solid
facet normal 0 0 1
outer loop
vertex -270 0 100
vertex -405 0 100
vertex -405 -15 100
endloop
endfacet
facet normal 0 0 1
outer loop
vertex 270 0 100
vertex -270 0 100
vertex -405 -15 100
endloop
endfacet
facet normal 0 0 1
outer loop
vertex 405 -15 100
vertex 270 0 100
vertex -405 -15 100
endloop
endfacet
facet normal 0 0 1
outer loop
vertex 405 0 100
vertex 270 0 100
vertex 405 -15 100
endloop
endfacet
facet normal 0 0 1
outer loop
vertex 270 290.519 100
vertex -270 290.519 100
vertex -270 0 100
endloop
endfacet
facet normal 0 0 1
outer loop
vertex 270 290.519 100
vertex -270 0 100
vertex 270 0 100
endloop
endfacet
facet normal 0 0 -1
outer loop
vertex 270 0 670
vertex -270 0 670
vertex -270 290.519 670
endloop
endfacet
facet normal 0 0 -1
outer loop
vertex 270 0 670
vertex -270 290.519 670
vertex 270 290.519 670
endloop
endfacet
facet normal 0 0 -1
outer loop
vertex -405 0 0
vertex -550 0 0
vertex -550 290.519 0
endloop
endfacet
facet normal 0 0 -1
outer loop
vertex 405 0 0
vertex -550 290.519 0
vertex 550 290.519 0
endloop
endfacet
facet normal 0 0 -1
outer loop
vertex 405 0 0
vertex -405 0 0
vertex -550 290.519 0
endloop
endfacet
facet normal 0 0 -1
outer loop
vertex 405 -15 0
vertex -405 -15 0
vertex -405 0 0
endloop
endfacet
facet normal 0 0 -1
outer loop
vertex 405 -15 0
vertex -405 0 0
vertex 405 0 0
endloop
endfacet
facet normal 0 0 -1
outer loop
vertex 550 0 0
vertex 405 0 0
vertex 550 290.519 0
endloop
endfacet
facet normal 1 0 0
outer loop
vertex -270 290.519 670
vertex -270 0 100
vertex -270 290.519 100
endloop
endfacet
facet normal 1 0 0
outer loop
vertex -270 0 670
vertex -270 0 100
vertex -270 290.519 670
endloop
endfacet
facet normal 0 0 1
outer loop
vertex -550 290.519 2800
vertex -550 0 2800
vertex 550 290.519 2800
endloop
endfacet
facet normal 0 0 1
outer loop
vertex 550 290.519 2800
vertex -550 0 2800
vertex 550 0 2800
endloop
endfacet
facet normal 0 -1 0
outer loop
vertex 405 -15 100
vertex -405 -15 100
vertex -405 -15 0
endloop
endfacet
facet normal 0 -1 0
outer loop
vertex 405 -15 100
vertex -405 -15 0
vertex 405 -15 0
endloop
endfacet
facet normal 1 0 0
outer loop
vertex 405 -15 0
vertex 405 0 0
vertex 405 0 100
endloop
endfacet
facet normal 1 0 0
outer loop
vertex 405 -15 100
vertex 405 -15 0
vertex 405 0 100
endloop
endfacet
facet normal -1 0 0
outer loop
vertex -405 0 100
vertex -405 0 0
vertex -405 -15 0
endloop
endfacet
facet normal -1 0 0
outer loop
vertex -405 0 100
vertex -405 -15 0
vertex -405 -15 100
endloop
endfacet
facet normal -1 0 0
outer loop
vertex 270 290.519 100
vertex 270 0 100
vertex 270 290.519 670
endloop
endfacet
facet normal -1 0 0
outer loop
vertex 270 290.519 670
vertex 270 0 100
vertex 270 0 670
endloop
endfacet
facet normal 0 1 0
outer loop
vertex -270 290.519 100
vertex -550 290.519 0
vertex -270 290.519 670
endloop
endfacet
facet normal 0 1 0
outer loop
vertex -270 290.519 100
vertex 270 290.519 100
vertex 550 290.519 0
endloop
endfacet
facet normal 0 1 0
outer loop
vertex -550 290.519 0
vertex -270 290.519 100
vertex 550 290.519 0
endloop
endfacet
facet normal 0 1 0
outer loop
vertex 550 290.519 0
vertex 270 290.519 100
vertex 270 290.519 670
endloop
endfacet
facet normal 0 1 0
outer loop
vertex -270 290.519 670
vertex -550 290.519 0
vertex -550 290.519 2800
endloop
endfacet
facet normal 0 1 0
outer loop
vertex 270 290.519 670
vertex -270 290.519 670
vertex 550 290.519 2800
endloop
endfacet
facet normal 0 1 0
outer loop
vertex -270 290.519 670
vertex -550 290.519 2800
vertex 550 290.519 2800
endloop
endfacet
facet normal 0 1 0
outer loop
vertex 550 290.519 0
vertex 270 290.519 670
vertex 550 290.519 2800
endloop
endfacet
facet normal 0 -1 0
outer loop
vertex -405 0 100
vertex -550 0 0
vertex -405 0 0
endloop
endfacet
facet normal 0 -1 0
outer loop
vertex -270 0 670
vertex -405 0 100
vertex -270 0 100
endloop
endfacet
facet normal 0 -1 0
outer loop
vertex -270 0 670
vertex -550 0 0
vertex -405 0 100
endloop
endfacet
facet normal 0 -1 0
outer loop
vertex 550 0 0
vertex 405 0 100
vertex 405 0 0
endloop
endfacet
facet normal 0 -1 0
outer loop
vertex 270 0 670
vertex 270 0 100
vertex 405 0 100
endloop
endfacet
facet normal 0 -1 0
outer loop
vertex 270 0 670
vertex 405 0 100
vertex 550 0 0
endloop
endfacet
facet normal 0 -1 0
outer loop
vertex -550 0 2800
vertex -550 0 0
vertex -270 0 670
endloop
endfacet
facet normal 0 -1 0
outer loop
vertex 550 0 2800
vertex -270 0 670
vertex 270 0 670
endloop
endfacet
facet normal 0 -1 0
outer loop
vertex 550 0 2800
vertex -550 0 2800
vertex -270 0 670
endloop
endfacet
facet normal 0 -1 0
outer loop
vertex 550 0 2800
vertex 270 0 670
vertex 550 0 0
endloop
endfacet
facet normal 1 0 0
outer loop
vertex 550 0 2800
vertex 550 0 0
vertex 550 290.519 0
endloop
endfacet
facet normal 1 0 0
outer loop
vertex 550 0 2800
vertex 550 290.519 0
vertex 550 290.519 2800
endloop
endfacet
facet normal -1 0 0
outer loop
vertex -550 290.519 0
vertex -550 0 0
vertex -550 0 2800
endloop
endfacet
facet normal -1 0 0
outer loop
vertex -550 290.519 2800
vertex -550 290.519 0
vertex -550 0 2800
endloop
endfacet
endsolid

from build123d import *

# Parameters (mm, degrees)
F0_W     = 1100
F0_H     = 2800
F4_DEPTH = 290.51879
F1_W     = 810
F1_H     = 100
F2_DEPTH = 15
F3_W     = 540
F3_H     = 570
F5_DEPTH = 300


with BuildPart() as f4:
    # F0 (on Front) → F4 (new body)
    with BuildSketch(Plane.XZ):
        with Locations((0, 1400)):
            Rectangle(F0_W, F0_H)
    extrude(amount=-F4_DEPTH)

    # F1 (on face) → F2 (join)
    with BuildSketch(Plane.XZ):
        with Locations((0, 50)):
            Rectangle(F1_W, F1_H)
    extrude(amount=F2_DEPTH)

    # F3 (on face) → F5 (cut)
    with BuildSketch(Plane.XZ):
        with Locations((0, 385)):
            Rectangle(F3_W, F3_H)
    extrude(amount=-F5_DEPTH, mode=Mode.SUBTRACT)


solid = f4.part
